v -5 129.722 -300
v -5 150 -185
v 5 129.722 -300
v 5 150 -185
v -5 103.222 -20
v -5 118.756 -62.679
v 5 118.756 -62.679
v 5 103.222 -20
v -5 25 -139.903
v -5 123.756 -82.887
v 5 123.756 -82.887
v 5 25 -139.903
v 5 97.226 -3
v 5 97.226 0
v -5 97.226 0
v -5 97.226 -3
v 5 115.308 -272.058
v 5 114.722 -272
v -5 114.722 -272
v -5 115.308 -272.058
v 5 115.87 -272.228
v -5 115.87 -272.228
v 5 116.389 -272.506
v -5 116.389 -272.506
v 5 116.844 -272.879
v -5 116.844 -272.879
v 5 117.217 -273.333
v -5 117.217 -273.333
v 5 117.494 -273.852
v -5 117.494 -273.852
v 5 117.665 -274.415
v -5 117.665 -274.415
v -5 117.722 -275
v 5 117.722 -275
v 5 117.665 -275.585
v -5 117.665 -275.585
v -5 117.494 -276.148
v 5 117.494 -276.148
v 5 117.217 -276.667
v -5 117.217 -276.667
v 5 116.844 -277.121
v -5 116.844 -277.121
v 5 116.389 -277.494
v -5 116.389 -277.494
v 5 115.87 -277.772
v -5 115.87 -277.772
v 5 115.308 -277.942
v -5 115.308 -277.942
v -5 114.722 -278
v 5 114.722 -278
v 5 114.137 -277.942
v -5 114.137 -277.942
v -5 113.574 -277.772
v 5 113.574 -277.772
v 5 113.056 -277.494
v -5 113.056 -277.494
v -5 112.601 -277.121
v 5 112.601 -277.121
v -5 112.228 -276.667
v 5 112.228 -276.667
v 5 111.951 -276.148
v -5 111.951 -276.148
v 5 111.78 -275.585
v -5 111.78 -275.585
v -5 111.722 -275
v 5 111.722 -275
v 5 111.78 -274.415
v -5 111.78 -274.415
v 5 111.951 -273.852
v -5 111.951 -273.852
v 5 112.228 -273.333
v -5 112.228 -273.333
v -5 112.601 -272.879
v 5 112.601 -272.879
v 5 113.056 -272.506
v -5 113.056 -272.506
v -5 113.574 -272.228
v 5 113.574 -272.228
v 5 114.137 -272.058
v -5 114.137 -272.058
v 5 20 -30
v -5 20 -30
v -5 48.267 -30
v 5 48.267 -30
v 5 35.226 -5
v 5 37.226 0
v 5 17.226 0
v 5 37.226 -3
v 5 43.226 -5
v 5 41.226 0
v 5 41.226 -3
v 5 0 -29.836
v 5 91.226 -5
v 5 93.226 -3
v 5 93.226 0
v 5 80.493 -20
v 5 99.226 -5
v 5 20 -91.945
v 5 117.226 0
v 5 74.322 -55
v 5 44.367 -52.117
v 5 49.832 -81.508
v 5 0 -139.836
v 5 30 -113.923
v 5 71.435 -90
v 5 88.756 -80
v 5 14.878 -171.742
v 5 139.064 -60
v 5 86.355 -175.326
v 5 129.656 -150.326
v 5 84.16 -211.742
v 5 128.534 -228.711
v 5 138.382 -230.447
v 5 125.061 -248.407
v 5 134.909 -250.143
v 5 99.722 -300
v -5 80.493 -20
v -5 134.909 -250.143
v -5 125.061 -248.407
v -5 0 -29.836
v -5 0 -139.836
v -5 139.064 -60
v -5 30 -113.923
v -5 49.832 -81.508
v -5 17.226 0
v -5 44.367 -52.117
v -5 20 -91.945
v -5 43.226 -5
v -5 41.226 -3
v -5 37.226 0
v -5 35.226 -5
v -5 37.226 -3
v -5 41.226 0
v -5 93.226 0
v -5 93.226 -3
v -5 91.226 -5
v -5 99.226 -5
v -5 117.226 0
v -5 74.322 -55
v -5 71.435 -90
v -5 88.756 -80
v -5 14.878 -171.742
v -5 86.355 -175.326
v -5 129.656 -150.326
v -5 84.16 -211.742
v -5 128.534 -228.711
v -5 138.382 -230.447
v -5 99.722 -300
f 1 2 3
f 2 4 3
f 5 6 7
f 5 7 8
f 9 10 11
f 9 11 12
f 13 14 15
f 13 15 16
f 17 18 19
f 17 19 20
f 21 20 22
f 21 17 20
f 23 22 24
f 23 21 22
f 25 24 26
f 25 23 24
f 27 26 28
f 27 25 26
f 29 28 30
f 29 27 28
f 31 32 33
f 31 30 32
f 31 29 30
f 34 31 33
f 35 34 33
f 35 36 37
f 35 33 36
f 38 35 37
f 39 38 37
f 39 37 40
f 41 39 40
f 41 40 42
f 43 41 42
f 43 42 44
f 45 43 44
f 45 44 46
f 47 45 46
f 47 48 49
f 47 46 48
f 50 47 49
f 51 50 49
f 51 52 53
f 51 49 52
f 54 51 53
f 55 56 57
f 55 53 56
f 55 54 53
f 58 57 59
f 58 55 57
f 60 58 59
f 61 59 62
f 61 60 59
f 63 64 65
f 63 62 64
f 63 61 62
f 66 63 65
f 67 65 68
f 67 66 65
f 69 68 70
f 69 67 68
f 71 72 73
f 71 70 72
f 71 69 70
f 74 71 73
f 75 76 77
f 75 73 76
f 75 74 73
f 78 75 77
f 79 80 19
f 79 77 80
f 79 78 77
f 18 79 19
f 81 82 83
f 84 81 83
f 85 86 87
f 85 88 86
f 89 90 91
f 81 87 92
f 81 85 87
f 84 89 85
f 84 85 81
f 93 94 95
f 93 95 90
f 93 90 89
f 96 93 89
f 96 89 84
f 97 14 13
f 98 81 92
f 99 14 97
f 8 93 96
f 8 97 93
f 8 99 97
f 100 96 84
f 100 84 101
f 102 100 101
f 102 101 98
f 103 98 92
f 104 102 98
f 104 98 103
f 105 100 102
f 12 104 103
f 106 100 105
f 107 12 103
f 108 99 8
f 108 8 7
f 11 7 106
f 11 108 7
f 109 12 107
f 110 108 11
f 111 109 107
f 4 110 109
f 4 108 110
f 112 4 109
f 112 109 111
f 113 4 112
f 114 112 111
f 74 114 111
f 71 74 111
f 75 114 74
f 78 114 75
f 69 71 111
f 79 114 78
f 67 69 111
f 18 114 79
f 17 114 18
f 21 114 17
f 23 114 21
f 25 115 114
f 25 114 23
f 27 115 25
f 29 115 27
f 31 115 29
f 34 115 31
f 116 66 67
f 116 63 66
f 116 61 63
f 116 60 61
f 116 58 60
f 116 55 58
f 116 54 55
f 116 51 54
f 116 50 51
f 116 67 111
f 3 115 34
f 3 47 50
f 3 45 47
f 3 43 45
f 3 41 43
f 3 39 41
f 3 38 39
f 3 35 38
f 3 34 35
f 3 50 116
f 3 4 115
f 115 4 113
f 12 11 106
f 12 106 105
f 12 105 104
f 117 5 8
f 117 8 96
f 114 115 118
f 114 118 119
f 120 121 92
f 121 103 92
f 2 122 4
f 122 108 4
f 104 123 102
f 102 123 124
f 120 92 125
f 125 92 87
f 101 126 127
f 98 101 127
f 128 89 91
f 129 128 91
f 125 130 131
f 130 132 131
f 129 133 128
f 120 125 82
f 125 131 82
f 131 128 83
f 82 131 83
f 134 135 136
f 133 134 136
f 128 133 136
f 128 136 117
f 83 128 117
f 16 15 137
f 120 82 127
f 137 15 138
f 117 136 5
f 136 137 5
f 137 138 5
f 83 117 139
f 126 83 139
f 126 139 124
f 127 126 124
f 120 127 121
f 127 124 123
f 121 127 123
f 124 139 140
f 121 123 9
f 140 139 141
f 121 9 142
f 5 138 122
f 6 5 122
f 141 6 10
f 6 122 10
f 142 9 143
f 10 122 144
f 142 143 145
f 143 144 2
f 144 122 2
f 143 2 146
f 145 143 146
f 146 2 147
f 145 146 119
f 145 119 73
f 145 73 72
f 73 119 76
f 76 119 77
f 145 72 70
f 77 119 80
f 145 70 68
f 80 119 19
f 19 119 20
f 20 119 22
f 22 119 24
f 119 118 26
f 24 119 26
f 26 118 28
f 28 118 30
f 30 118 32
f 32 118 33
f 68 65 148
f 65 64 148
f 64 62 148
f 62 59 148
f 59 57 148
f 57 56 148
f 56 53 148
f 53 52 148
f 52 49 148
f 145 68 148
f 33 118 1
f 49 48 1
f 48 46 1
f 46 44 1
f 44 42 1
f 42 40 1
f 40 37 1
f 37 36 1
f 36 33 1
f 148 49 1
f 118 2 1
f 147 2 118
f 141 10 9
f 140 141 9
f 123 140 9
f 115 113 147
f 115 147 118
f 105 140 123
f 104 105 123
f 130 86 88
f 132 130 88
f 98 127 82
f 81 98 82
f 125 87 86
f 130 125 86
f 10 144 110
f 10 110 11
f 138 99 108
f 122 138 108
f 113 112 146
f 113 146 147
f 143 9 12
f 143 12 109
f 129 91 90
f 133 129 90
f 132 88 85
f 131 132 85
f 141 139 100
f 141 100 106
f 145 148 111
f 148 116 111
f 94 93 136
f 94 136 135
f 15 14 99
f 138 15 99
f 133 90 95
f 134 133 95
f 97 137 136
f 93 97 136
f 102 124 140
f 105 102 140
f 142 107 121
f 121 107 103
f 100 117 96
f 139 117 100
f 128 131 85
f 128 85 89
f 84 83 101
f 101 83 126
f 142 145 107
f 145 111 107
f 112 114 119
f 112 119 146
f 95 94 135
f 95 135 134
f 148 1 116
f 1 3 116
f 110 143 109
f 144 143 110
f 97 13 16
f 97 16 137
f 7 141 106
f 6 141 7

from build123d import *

# Parameters (mm, degrees)
ESQUISSE1_W                  = 300
ESQUISSE1_H                  = 150
BOSS_EXTRU_1_DEPTH           = 5
ESQUISSE2_OUTSIDE_W          = 369.112
ESQUISSE2_OUTSIDE_H          = 219.112
ENL_V_MAT_EXTRU_1_DEPTH      = 5
ENL_V_MAT_EXTRU_2_DEPTH      = 336.559234711
ENL_V_MAT_EXTRU_2_DEPTH_BACK = 336.559234711
ENL_V_MAT_EXTRU_3_DEPTH      = 336.559234711
ENL_V_MAT_EXTRU_3_DEPTH_BACK = 336.559234711
ENL_V_MAT_EXTRU_4_DEPTH      = 336.559234711
ENL_V_MAT_EXTRU_4_DEPTH_BACK = 336.559234711
ESQUISSE5_R                  = 3
ENL_V_MAT_EXTRU_5_DEPTH      = 49


with BuildPart() as part:
    # Esquisse1 → Boss.-Extru.1 (new, symmetric)
    with BuildSketch(Plane(origin=(0, 0, 0), x_dir=(0, 0, -1), z_dir=(1, 0, 0))):
        with Locations((150, 75)):
            Rectangle(ESQUISSE1_W, ESQUISSE1_H)
    extrude(amount=BOSS_EXTRU_1_DEPTH, both=True)

    # Esquisse2 outside → Enlèv. mat.-Extru.1 (cut, symmetric)
    with BuildSketch(Plane(origin=(0, 0, 0), x_dir=(0, 0, -1), z_dir=(1, 0, 0))):
        with Locations((150, 75)):
            Rectangle(ESQUISSE2_OUTSIDE_W, ESQUISSE2_OUTSIDE_H)
        Polygon((0, 117.225703003), (60, 139.063917059), (185, 150), (300, 129.722397219), (300, 99.722397219), (211.741963761, 84.160124165), (171.741963761, 14.878091862), (139.835792798, 0), (29.835792798, 0), (0, 17.225703003), align=None, mode=Mode.SUBTRACT)
    extrude(amount=ENL_V_MAT_EXTRU_1_DEPTH, both=True, mode=Mode.SUBTRACT)

    # Esquisse3 → Enlèv. mat.-Extru.2 (cut, two sides: drawn at the far end of the back side and taken through both)
    with BuildSketch(Plane(origin=(5, 0, 0), x_dir=(0, 0, -1), z_dir=(1, 0, 0)).offset(-ENL_V_MAT_EXTRU_2_DEPTH_BACK)):
        Polygon((20, 103.221552239), (20, 80.493304508), (55, 74.321860183), (80, 88.755616913), (62.679491924, 118.755616913), align=None)
        Polygon((90, 71.435108837), (113.922571241, 30), (81.508057782, 49.831775443), align=None)
        Polygon((82.886751346, 123.755616913), (139.903333355, 25), (175.32640016, 86.354551467), (150.32640016, 129.655821657), align=None)
        Polygon((91.944969354, 20), (30, 20), (30, 48.267236345), (52.117107943, 44.367393479), align=None)
    extrude(amount=ENL_V_MAT_EXTRU_2_DEPTH + ENL_V_MAT_EXTRU_2_DEPTH_BACK, mode=Mode.SUBTRACT)

    # Esquisse4 → Enlèv. mat.-Extru.3 (cut, two sides: drawn at the far end of the back side and taken through both)
    with BuildSketch(Plane(origin=(5, 0, 0), x_dir=(0, 0, -1), z_dir=(1, 0, 0)).offset(-ENL_V_MAT_EXTRU_3_DEPTH_BACK)):
        Polygon((0, 97.225703003), (3, 97.225703003), (5, 99.225703003), (5, 91.225703003), (3, 93.225703003), (0, 93.225703003), align=None)
        Polygon((3, 41.225703003), (0, 41.225703003), (0, 37.225703003), (3, 37.225703003), (5, 35.225703003), (5, 43.225703003), align=None)
    extrude(amount=ENL_V_MAT_EXTRU_3_DEPTH + ENL_V_MAT_EXTRU_3_DEPTH_BACK, mode=Mode.SUBTRACT)

    # Esquisse5 → Enlèv. mat.-Extru.4 (cut, two sides: drawn at the far end of the back side and taken through both)
    with BuildSketch(Plane.ZY.offset(5).offset(-ENL_V_MAT_EXTRU_4_DEPTH_BACK)):
        with Locations((-275, 114.722397219)):
            Circle(ESQUISSE5_R)
    extrude(amount=ENL_V_MAT_EXTRU_4_DEPTH + ENL_V_MAT_EXTRU_4_DEPTH_BACK, mode=Mode.SUBTRACT)

    # Esquisse6 → Enlèv. mat.-Extru.5 (cut)
    with BuildSketch(Plane(origin=(5, 0, 0), x_dir=(0, 0, -1), z_dir=(1, 0, 0))):
        Polygon((230.447006258, 138.381702132), (250.143161319, 134.908738579), (248.406679542, 125.060661049), (228.710524482, 128.533624602), align=None)
    extrude(amount=-ENL_V_MAT_EXTRU_5_DEPTH, mode=Mode.SUBTRACT)


solid = part.part
